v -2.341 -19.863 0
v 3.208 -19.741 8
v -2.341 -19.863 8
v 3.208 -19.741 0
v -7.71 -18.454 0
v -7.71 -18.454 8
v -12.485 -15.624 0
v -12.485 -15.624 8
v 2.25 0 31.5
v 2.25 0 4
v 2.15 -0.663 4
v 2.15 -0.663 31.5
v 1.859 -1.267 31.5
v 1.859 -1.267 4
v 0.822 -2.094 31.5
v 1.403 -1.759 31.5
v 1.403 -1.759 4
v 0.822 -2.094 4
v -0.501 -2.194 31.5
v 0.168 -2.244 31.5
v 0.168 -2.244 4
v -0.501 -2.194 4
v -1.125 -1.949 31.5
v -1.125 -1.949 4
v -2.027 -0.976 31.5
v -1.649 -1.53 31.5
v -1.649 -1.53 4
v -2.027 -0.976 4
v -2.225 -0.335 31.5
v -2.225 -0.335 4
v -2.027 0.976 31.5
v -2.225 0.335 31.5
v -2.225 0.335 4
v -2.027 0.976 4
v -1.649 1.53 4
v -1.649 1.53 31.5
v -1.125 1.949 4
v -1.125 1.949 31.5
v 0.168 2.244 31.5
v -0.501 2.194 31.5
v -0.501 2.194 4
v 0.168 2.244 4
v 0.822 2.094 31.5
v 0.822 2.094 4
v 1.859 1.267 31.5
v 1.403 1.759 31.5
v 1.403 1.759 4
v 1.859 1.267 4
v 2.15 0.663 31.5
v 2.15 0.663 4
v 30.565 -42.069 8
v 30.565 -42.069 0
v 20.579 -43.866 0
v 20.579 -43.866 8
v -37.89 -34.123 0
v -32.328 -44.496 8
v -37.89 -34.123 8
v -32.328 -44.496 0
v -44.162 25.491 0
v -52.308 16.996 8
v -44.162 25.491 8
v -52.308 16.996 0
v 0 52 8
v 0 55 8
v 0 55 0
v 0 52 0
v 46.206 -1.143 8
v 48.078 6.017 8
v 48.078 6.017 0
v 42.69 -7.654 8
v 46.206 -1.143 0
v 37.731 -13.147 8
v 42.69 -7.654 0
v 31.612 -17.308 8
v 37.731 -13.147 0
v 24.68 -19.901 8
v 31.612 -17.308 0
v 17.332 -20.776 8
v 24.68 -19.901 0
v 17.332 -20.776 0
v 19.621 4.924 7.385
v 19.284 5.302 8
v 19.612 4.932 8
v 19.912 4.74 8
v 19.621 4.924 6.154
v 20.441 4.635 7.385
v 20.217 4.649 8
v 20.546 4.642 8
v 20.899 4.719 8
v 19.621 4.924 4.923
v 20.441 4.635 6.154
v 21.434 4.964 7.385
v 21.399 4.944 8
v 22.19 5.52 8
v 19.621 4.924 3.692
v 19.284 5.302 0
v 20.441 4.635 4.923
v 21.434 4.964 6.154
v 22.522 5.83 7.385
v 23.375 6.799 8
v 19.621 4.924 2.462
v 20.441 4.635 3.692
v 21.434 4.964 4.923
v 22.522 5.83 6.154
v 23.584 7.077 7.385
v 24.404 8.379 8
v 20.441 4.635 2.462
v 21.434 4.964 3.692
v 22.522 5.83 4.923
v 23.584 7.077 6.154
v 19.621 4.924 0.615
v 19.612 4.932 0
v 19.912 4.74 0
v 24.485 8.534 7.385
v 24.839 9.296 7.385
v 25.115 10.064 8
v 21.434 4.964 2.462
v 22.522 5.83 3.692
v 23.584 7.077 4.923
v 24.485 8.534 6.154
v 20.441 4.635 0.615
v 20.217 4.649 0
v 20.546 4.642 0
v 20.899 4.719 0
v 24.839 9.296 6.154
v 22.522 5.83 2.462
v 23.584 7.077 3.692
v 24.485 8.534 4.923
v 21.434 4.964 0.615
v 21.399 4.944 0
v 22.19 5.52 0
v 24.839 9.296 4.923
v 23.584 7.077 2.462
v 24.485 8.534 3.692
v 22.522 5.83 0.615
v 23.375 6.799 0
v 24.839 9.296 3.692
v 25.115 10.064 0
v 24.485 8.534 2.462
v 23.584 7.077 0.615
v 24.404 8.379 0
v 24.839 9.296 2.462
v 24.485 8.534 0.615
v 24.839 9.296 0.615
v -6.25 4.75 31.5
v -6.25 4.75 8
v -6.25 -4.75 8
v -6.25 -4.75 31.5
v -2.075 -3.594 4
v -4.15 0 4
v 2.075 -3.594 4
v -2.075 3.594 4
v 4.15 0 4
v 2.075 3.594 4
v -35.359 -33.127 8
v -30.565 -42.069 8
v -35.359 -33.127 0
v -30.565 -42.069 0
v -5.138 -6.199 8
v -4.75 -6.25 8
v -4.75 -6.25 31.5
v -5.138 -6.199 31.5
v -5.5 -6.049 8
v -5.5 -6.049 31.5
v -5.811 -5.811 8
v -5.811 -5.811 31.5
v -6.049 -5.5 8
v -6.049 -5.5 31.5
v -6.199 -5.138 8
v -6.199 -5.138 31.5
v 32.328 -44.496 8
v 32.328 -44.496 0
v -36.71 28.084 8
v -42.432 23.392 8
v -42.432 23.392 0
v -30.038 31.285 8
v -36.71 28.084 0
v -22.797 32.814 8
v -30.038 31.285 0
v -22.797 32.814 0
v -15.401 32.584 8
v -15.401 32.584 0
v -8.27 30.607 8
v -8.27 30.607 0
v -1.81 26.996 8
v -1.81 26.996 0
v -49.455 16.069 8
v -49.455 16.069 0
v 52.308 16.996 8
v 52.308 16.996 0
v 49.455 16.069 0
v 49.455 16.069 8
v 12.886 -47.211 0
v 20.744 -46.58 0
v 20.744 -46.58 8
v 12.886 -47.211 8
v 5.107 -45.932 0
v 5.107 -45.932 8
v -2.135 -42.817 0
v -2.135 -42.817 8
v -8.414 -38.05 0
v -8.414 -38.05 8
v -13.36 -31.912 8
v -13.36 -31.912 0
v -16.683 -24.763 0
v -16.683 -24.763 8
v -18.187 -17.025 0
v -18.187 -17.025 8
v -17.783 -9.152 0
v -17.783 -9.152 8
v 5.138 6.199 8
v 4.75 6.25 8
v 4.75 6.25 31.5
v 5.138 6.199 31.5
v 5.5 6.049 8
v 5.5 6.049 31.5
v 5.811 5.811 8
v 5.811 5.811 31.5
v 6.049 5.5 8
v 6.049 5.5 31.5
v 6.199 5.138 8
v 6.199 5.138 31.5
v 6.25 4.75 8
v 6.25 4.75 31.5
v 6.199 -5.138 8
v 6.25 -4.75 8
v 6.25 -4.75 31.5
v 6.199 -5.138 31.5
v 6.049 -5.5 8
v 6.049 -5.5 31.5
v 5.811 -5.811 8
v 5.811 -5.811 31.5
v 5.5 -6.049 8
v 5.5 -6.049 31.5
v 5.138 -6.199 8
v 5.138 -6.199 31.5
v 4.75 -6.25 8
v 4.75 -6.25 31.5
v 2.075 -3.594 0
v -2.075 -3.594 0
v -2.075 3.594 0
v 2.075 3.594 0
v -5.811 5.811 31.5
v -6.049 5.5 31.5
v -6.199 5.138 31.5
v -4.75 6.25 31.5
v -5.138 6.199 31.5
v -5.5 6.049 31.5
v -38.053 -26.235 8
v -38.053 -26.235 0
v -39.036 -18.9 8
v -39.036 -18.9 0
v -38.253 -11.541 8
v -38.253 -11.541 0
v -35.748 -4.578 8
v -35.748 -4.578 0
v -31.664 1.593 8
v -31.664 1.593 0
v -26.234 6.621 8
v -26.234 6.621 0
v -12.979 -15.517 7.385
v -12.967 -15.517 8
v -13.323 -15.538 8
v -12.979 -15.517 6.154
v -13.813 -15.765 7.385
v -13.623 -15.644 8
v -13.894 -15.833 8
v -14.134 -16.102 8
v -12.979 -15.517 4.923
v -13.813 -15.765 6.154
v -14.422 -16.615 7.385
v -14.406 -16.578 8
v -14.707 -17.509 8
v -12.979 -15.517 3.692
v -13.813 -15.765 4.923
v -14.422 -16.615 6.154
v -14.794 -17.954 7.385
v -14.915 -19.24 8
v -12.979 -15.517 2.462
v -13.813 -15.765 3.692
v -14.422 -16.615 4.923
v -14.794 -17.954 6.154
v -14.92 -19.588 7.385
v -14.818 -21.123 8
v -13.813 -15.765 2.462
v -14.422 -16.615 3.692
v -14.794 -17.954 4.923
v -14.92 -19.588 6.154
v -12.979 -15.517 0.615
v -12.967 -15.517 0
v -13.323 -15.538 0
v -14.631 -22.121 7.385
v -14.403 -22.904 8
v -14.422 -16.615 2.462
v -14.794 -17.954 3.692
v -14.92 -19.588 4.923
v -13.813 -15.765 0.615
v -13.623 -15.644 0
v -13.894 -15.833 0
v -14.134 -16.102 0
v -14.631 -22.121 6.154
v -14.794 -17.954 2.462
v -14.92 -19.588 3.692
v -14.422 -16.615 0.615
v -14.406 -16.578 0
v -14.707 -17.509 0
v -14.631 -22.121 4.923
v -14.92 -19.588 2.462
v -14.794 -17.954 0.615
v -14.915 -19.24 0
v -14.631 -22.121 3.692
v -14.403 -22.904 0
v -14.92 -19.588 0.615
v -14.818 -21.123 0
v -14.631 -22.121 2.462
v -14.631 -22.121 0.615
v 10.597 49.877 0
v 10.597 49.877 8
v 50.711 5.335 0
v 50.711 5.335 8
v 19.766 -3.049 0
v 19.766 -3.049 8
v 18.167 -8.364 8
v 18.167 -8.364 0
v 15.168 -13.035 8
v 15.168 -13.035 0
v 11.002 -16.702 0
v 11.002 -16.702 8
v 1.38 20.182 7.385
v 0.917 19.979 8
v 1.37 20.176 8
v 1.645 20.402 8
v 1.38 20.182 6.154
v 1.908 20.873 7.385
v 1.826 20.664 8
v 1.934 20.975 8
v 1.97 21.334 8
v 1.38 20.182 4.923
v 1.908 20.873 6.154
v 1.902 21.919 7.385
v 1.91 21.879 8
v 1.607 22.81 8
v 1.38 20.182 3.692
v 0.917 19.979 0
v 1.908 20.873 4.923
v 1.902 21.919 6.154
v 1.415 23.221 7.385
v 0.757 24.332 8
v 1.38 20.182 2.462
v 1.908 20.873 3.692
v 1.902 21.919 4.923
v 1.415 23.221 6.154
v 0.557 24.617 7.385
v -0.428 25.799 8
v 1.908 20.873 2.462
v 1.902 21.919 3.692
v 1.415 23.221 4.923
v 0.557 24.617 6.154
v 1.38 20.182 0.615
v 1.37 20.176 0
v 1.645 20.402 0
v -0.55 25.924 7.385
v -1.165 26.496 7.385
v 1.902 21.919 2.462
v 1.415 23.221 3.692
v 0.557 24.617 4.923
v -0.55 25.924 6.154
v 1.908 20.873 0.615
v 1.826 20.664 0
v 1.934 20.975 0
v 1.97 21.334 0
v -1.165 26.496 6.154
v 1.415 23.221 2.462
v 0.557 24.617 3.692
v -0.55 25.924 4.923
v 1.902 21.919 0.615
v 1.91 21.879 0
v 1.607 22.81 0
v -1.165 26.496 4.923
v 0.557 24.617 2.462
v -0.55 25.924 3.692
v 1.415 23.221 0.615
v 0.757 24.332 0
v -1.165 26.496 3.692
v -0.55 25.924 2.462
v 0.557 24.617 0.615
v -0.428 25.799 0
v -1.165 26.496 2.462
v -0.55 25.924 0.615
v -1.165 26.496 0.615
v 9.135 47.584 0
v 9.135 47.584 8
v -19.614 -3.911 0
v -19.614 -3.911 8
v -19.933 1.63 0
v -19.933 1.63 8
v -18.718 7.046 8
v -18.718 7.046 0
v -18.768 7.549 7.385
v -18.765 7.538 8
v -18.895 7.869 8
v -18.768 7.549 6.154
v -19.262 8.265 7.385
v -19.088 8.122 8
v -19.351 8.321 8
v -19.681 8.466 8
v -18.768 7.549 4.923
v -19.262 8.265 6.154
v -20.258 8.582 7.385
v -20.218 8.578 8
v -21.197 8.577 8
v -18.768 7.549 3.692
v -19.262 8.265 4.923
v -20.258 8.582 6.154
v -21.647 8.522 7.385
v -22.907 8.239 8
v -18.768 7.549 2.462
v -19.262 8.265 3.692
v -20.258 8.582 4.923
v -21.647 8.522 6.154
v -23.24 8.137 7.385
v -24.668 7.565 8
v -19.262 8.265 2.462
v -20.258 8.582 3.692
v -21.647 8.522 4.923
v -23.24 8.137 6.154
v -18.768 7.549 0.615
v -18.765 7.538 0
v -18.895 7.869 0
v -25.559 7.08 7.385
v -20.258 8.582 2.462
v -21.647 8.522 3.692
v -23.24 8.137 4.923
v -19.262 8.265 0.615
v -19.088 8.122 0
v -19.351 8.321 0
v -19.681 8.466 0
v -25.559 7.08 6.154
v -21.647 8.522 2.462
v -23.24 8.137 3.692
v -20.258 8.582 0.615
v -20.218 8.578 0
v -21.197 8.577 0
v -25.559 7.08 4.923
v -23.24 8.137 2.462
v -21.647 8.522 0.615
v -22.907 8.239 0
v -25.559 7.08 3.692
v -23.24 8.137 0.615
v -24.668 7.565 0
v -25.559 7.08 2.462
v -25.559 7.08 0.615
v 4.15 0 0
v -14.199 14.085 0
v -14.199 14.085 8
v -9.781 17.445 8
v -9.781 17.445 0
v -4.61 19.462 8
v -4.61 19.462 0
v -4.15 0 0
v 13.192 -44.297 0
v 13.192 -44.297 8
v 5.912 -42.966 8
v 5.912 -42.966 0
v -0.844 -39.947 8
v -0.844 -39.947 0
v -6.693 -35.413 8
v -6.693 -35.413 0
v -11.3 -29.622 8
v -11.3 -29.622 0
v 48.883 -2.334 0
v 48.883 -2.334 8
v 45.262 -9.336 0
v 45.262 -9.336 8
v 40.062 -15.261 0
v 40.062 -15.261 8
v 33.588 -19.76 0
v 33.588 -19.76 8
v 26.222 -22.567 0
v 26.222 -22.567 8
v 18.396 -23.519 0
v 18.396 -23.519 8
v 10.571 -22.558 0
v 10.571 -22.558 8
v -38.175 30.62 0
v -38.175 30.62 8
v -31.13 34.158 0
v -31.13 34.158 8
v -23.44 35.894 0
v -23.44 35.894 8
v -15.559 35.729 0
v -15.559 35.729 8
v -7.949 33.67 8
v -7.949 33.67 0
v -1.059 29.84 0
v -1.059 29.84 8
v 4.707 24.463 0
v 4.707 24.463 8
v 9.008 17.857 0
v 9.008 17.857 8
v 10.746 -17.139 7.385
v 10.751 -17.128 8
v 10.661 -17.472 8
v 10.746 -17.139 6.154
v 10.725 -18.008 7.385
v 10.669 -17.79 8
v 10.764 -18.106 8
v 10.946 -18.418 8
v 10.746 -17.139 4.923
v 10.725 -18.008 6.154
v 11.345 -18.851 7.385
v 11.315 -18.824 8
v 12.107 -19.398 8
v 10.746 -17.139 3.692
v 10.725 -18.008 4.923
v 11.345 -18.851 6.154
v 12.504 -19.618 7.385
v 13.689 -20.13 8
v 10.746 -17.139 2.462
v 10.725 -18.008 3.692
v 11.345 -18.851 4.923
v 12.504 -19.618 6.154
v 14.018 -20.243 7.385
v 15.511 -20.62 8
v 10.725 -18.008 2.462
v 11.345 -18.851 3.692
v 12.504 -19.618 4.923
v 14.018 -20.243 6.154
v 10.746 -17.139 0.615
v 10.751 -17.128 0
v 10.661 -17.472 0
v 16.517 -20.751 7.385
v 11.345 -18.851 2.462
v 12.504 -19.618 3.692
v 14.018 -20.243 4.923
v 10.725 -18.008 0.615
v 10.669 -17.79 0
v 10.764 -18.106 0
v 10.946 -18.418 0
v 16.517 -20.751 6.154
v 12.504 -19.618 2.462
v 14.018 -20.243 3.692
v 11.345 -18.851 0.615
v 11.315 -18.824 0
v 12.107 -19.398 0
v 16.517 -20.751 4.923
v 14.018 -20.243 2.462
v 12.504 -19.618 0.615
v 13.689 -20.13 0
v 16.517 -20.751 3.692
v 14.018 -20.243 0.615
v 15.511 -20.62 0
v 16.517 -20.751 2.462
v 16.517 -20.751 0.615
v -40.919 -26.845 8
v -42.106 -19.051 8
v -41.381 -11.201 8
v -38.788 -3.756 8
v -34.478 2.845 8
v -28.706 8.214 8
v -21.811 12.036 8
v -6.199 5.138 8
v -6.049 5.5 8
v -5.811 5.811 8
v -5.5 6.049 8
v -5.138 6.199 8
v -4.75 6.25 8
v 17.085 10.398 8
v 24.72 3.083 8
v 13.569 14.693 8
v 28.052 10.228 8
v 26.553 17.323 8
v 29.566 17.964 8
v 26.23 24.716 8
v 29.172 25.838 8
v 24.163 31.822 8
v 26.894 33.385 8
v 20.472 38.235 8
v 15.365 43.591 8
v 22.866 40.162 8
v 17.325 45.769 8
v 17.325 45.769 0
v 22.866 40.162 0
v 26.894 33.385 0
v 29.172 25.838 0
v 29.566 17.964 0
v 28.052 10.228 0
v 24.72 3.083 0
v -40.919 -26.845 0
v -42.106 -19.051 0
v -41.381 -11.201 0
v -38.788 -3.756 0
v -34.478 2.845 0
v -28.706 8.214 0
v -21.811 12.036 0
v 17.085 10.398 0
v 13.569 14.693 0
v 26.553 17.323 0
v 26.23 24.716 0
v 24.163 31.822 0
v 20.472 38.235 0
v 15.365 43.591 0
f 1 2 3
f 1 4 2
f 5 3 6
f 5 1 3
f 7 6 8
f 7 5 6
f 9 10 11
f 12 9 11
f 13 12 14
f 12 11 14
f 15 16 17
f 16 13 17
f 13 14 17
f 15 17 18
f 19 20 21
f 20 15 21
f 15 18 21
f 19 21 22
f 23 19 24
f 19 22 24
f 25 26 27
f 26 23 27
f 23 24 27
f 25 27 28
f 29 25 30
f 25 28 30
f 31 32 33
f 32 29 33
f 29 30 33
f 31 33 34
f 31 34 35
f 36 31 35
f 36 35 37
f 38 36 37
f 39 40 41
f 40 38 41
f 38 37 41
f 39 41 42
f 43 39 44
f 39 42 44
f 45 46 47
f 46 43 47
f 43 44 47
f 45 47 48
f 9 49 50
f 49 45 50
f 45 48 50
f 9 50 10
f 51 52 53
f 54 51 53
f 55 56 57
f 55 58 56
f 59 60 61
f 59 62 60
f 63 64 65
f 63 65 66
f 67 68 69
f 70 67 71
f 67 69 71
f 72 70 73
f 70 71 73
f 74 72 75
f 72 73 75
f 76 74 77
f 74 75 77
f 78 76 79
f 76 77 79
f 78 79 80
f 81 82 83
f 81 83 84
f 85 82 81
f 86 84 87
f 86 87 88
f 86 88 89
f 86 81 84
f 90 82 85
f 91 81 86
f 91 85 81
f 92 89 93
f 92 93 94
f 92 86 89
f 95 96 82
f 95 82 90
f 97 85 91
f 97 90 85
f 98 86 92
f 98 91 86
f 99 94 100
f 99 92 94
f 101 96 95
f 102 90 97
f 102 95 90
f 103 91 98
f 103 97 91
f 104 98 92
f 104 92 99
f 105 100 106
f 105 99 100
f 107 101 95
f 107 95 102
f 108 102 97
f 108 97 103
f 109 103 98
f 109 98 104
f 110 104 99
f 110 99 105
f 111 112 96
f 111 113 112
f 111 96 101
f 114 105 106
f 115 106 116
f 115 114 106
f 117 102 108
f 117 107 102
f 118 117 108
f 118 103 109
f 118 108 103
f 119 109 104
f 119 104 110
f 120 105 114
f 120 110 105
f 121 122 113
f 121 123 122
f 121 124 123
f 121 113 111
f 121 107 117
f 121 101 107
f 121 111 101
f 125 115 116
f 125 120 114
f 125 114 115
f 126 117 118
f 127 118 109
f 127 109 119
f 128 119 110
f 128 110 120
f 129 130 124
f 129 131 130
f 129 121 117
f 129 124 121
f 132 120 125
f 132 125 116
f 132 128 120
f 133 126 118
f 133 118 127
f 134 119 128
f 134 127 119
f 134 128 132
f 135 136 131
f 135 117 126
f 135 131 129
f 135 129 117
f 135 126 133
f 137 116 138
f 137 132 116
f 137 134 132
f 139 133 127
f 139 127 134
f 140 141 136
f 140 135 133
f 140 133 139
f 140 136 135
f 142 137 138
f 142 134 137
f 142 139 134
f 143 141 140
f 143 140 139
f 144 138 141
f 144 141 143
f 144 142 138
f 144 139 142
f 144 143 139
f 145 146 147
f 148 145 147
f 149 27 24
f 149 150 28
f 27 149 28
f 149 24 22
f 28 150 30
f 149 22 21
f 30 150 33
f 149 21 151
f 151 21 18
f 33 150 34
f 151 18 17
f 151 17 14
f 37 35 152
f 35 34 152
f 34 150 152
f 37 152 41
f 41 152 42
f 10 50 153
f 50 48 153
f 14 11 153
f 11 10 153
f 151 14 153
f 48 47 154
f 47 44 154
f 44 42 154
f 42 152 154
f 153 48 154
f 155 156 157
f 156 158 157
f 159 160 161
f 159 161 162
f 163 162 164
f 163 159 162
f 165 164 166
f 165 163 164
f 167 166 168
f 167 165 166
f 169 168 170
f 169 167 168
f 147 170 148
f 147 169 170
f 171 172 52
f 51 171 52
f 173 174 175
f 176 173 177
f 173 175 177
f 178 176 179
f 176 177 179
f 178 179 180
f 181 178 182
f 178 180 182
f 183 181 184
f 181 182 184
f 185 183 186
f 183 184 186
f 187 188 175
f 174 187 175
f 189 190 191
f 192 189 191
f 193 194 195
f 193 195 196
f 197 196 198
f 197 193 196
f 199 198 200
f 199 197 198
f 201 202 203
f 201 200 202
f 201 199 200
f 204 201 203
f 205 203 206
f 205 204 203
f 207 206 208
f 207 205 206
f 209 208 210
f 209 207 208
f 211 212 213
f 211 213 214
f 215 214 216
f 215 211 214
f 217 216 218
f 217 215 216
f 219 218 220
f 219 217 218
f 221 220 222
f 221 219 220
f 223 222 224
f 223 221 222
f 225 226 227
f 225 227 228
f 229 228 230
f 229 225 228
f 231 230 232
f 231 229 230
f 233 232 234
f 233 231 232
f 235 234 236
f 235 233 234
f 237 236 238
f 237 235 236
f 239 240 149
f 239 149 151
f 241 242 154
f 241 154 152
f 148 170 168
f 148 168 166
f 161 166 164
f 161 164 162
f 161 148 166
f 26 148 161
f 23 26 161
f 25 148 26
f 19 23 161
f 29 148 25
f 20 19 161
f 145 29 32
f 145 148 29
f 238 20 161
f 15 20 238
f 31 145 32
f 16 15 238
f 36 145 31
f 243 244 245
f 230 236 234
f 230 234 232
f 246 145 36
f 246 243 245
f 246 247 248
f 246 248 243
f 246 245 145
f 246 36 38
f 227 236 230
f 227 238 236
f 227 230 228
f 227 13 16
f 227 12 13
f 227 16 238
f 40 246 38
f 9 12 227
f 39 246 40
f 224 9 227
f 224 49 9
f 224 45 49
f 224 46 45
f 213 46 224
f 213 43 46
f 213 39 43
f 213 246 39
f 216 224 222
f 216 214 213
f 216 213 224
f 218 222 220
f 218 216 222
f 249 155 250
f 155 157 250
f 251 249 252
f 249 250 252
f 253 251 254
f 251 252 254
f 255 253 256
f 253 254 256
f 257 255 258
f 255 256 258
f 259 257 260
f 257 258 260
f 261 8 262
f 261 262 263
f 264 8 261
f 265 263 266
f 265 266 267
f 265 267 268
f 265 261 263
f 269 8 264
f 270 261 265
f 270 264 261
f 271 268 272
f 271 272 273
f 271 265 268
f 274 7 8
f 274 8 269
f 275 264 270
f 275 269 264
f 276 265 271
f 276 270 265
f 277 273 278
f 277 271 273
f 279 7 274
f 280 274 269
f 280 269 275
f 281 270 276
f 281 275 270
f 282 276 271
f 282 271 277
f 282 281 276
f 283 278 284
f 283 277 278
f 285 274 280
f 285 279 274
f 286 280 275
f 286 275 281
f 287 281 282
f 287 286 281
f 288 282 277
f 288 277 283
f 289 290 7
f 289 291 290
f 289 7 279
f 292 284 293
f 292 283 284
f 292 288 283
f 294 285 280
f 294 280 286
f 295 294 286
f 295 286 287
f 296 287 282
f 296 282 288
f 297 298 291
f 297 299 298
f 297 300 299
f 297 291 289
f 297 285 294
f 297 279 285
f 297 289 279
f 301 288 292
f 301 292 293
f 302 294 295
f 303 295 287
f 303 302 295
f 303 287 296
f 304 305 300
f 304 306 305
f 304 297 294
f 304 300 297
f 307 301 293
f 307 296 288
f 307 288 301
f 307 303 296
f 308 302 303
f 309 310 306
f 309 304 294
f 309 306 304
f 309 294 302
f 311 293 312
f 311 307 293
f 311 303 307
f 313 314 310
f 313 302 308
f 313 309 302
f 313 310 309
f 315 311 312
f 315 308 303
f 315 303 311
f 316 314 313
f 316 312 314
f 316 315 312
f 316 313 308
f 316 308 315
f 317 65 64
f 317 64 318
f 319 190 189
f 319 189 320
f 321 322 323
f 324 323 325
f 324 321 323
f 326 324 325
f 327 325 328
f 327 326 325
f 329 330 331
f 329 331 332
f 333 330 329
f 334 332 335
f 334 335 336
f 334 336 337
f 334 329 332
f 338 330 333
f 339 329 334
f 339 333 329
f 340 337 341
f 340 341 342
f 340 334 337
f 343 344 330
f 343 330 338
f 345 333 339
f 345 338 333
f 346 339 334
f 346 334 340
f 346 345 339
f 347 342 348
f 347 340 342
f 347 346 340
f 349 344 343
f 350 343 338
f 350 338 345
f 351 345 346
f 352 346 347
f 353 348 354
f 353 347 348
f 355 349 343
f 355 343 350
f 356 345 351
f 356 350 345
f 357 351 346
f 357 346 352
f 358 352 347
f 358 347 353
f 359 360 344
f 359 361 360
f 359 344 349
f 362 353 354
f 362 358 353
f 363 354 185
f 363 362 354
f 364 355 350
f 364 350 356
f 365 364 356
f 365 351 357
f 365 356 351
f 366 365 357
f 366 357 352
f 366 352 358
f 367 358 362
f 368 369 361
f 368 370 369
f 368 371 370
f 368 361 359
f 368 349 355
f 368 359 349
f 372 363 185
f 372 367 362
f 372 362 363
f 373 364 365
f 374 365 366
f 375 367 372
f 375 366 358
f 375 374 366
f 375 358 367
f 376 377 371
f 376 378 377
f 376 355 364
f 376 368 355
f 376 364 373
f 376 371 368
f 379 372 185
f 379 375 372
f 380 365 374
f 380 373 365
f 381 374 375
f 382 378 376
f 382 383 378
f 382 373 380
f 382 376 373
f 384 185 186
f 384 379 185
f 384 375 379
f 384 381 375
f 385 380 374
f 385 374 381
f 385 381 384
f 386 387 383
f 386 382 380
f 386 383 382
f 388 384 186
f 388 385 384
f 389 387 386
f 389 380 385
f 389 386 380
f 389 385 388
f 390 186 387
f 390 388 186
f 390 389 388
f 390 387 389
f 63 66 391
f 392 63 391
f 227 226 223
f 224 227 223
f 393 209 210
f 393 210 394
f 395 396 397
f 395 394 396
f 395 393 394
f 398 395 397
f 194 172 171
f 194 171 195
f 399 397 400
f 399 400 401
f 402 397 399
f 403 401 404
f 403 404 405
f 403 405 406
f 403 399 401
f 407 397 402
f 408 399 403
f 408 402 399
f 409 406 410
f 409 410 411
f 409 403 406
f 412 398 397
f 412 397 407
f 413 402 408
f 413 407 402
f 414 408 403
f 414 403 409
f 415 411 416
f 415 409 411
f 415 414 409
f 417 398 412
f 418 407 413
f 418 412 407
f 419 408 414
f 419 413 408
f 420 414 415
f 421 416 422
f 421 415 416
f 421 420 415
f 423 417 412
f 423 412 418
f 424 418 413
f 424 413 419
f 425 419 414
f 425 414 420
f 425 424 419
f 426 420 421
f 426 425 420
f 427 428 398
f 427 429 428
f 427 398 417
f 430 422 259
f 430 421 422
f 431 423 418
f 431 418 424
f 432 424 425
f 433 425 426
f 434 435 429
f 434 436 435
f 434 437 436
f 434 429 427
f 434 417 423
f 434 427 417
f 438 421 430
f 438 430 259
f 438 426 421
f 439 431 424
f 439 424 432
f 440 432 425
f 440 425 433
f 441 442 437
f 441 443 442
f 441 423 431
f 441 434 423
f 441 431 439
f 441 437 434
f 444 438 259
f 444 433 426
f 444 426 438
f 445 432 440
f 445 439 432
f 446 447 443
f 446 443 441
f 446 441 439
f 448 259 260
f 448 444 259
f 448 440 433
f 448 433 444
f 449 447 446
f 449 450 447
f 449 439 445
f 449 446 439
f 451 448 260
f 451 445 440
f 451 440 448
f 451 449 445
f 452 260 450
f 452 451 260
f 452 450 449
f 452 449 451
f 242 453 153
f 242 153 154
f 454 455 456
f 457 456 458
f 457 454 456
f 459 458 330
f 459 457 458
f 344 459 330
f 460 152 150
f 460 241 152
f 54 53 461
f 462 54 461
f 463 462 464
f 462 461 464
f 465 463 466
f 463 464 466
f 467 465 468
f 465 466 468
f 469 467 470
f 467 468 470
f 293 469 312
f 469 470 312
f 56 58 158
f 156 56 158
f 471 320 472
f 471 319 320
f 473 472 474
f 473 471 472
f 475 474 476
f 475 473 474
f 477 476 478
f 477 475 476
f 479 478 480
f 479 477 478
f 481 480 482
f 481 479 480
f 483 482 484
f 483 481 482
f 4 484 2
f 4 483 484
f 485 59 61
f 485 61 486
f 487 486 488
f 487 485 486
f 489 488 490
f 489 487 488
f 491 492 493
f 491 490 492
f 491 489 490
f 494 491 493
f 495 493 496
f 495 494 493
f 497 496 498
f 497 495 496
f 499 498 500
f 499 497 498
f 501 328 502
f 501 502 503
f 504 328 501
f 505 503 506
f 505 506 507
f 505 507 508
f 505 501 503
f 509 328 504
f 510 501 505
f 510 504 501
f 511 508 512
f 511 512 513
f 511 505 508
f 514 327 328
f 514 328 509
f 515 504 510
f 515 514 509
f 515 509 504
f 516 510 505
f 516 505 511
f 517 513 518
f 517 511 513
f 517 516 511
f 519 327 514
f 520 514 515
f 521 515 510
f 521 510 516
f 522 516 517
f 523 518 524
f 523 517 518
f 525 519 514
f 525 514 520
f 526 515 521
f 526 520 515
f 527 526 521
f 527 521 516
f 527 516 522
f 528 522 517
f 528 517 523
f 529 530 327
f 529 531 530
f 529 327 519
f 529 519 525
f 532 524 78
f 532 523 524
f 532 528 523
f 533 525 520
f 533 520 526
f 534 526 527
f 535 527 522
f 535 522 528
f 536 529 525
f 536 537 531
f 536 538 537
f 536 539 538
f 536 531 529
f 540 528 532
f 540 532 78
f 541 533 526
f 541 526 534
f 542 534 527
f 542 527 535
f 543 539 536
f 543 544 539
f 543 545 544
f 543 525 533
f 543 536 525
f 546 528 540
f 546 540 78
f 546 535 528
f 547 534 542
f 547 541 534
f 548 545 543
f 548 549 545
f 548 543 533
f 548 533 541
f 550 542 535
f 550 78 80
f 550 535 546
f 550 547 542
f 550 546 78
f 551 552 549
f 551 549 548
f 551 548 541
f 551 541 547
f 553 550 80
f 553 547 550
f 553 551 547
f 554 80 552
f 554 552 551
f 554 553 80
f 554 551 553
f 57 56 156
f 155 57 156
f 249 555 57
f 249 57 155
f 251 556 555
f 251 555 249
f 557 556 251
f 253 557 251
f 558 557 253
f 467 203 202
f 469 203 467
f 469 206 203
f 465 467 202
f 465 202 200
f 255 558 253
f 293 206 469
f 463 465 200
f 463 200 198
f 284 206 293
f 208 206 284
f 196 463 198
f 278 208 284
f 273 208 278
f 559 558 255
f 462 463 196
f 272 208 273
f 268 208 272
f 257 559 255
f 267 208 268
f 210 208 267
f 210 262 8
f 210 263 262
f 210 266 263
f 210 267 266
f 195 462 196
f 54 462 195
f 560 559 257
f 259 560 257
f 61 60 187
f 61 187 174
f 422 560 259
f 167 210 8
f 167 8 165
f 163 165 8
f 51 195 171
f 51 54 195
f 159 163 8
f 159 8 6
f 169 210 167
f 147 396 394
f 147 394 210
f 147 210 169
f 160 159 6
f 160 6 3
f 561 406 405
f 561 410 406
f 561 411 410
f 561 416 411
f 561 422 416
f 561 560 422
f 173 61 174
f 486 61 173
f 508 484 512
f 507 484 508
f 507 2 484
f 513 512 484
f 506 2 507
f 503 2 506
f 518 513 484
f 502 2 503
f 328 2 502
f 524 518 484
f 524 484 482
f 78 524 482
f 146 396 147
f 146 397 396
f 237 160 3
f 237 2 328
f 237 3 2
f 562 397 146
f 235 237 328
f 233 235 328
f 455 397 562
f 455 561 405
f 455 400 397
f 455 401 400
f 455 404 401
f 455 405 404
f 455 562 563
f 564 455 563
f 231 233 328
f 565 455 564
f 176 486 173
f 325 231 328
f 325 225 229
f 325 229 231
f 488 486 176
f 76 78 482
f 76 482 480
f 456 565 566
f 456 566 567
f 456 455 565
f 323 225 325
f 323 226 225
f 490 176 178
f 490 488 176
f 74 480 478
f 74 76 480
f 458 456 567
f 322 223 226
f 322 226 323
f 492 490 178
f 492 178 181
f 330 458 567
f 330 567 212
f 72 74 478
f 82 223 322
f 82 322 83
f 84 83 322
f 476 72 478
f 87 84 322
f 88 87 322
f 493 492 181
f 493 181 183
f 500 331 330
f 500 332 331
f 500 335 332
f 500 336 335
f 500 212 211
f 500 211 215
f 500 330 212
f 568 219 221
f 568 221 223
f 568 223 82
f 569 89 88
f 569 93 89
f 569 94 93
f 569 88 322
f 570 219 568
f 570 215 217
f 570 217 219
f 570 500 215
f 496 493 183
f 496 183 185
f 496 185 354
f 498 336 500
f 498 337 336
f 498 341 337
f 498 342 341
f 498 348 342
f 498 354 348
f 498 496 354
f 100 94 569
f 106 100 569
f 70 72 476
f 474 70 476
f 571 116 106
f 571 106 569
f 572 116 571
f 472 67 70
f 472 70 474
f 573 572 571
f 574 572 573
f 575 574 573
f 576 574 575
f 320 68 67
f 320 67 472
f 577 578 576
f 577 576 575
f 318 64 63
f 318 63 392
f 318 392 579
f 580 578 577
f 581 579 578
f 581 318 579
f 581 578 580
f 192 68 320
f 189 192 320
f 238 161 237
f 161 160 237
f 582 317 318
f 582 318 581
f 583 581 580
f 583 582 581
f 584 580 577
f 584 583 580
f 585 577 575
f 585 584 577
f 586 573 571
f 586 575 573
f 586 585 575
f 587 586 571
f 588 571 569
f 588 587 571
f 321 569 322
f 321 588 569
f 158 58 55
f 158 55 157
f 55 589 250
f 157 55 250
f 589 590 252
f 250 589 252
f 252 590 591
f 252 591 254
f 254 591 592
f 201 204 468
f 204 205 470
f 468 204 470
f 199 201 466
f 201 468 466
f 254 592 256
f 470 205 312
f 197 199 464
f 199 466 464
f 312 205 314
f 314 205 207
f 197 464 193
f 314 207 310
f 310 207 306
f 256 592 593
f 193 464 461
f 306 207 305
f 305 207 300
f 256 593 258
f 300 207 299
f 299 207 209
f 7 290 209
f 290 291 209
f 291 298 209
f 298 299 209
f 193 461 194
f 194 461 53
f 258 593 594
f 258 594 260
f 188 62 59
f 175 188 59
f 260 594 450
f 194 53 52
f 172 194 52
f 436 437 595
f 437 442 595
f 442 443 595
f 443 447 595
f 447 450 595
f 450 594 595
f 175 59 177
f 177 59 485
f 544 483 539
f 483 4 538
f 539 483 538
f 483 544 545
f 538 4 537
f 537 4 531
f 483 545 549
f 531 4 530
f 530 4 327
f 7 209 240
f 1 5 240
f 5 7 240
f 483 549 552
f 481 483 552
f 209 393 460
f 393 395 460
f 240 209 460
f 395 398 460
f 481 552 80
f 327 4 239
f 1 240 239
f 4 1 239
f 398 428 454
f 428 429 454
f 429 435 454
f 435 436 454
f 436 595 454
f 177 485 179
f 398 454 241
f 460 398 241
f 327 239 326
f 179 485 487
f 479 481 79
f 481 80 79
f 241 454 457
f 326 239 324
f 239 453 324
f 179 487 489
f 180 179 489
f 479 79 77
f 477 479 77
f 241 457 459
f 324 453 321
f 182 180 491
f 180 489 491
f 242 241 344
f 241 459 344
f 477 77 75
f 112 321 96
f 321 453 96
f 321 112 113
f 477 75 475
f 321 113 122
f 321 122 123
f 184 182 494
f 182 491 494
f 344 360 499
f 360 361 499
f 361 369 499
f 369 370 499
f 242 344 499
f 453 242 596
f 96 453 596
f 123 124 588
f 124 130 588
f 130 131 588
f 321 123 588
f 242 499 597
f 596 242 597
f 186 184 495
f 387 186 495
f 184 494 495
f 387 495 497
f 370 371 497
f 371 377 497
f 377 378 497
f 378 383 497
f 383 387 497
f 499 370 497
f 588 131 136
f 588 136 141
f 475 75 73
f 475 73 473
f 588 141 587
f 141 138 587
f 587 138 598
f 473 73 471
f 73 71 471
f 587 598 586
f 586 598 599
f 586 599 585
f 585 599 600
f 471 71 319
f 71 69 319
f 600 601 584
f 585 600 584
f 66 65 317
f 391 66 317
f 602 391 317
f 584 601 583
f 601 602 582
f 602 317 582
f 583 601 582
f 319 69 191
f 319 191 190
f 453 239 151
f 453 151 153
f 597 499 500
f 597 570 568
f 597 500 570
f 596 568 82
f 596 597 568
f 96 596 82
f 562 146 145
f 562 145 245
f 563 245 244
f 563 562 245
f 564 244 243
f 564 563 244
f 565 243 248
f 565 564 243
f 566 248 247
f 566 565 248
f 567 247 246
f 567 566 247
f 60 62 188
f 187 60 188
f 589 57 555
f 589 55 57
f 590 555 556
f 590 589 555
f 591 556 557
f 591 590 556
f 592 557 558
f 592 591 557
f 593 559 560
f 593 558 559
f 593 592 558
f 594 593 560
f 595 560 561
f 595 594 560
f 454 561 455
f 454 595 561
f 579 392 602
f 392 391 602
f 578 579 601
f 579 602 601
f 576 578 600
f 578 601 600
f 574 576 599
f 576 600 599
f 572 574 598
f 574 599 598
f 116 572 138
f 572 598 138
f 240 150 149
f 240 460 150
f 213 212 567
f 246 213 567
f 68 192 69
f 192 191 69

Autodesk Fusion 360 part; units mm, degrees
sketch "bottom" plane through (0, 0, 0) normal (0, 0, 1) x (1, 0, 0)
  circle A0 centre (0, 0) radius 2.25
  line L0 (4.15, 0) -> (2.075, 3.594)
  line L1 (2.075, 3.594) -> (-2.075, 3.594)
  line L2 (-2.075, 3.594) -> (-4.15, 0)
  line L3 (-4.15, 0) -> (-2.075, -3.594)
  line L4 (-2.075, -3.594) -> (2.075, -3.594)
  line L5 (2.075, -3.594) -> (4.15, 0)
  line L6 (4.75, 6.25) -> (-4.75, 6.25)
  line L7 (-6.25, 4.75) -> (-6.25, -4.75)
  line L8 (-4.75, -6.25) -> (4.75, -6.25)
  line L9 (6.25, -4.75) -> (6.25, 4.75)
  line L10 (6.25, 6.25) -> (-6.25, -6.25) construction
  line L11 (-6.25, 6.25) -> (6.25, -6.25) construction
  arc A1 (4.75, -6.25) -> (6.25, -4.75) centre (4.75, -4.75) ccw
  arc A2 (-6.25, -4.75) -> (-4.75, -6.25) centre (-4.75, -4.75) ccw
  arc A3 (-4.75, 6.25) -> (-6.25, 4.75) centre (-4.75, 4.75) ccw
  arc A4 (6.25, 4.75) -> (4.75, 6.25) centre (4.75, 4.75) ccw
  circle A5 centre (0, 0) radius 20
  circle A6 centre (0, 0) radius 55
  line L12 (0, 55) -> (0, 52)
  line L13 (0, 55) -> (10.5968, 49.8773)
  line L14 (0, 55) -> (11.77, 55) construction
  line L15 (0, 52) -> (10.5968, 46.8773)
  arc A7 (25.1153, 10.0637) -> (9.1347, 47.5841) centre (-4.3574, 19.6742) ccw
  arc A8 (19.7662, -3.0491) -> (10.5968, 49.8773) centre (-2.8509, 20.29) ccw
  spline S0 degree 5 poles (19.2844, 5.302) (19.288, 5.2968) (19.3924, 5.1455) (19.6116, 4.8896) (19.9793, 4.632) (20.5483, 4.5429) (21.3688, 4.8461) (22.2615, 5.515) (23.1597, 6.4634) (23.9893, 7.5946) (24.5403, 8.5729) (24.8652, 9.3175) (25.039, 9.8148) (25.1153, 10.0637) knots 0.196493 0.196493 0.196493 0.196493 0.196493 0.196493 0.2 0.3 0.4 0.5 0.6 0.7 0.8 0.9 1 1 1 1 1 1
  line L16 (18.6573, 6.2172) -> (19.9116, 4.3867)
  line L17 (24.8256, 9.1182) -> (25.4049, 11.0092)
  point P0 (20.8497, 4.7036)
  dimension "d1" = 4.5
  dimension "d2" = 4.15
  dimension "d3" = 12.5
  dimension "d4" = 12.5
  dimension "d5" = 1.5
  dimension "d6" = 1.5
  dimension "d7" = 1.5
  dimension "d8" = 40
  dimension "d9" = 110
  dimension "d10" = 3
  dimension "d11" = 25.8
  dimension "d12" = 11.77
  dimension "d13" = 11.77
  dimension "d14" = 62
  dimension "d16" = 65
extrude "Extrude2" add sketch "bottom" along normal blind 8 contours A5 L12 L13 L15 A7 A8 S0 L17 makes body 1
pattern_circular "C-Pattern1" count 5 over 360 about axis through (0, 0, 0) along (0, 0, 1) of "Extrude2" makes body 2 makes body 3 makes body 4 makes body 5
extrude "Extrude3" add sketch "bottom" along normal blind 8 contours L0 L1 L2 L3 L4 L5 | L6 L7 L8 L9 A1 A2 A3 A4 | A5 bodies 1 2 3 4 5
extrude "Extrude4" add sketch "bottom" along normal blind 31.5 contours L0 L1 L2 L3 L4 L5 | L6 L7 L8 L9 A1 A2 A3 A4 bodies 1
extrude "Extrude5" cut sketch "bottom" along normal blind 4 contours L0 L1 L2 L3 L4 L5 bodies 1
equation "d2 = ( 8.3 / 2 ) * 1 mm"
equation "d11 = 90 deg - 64.2 deg"
